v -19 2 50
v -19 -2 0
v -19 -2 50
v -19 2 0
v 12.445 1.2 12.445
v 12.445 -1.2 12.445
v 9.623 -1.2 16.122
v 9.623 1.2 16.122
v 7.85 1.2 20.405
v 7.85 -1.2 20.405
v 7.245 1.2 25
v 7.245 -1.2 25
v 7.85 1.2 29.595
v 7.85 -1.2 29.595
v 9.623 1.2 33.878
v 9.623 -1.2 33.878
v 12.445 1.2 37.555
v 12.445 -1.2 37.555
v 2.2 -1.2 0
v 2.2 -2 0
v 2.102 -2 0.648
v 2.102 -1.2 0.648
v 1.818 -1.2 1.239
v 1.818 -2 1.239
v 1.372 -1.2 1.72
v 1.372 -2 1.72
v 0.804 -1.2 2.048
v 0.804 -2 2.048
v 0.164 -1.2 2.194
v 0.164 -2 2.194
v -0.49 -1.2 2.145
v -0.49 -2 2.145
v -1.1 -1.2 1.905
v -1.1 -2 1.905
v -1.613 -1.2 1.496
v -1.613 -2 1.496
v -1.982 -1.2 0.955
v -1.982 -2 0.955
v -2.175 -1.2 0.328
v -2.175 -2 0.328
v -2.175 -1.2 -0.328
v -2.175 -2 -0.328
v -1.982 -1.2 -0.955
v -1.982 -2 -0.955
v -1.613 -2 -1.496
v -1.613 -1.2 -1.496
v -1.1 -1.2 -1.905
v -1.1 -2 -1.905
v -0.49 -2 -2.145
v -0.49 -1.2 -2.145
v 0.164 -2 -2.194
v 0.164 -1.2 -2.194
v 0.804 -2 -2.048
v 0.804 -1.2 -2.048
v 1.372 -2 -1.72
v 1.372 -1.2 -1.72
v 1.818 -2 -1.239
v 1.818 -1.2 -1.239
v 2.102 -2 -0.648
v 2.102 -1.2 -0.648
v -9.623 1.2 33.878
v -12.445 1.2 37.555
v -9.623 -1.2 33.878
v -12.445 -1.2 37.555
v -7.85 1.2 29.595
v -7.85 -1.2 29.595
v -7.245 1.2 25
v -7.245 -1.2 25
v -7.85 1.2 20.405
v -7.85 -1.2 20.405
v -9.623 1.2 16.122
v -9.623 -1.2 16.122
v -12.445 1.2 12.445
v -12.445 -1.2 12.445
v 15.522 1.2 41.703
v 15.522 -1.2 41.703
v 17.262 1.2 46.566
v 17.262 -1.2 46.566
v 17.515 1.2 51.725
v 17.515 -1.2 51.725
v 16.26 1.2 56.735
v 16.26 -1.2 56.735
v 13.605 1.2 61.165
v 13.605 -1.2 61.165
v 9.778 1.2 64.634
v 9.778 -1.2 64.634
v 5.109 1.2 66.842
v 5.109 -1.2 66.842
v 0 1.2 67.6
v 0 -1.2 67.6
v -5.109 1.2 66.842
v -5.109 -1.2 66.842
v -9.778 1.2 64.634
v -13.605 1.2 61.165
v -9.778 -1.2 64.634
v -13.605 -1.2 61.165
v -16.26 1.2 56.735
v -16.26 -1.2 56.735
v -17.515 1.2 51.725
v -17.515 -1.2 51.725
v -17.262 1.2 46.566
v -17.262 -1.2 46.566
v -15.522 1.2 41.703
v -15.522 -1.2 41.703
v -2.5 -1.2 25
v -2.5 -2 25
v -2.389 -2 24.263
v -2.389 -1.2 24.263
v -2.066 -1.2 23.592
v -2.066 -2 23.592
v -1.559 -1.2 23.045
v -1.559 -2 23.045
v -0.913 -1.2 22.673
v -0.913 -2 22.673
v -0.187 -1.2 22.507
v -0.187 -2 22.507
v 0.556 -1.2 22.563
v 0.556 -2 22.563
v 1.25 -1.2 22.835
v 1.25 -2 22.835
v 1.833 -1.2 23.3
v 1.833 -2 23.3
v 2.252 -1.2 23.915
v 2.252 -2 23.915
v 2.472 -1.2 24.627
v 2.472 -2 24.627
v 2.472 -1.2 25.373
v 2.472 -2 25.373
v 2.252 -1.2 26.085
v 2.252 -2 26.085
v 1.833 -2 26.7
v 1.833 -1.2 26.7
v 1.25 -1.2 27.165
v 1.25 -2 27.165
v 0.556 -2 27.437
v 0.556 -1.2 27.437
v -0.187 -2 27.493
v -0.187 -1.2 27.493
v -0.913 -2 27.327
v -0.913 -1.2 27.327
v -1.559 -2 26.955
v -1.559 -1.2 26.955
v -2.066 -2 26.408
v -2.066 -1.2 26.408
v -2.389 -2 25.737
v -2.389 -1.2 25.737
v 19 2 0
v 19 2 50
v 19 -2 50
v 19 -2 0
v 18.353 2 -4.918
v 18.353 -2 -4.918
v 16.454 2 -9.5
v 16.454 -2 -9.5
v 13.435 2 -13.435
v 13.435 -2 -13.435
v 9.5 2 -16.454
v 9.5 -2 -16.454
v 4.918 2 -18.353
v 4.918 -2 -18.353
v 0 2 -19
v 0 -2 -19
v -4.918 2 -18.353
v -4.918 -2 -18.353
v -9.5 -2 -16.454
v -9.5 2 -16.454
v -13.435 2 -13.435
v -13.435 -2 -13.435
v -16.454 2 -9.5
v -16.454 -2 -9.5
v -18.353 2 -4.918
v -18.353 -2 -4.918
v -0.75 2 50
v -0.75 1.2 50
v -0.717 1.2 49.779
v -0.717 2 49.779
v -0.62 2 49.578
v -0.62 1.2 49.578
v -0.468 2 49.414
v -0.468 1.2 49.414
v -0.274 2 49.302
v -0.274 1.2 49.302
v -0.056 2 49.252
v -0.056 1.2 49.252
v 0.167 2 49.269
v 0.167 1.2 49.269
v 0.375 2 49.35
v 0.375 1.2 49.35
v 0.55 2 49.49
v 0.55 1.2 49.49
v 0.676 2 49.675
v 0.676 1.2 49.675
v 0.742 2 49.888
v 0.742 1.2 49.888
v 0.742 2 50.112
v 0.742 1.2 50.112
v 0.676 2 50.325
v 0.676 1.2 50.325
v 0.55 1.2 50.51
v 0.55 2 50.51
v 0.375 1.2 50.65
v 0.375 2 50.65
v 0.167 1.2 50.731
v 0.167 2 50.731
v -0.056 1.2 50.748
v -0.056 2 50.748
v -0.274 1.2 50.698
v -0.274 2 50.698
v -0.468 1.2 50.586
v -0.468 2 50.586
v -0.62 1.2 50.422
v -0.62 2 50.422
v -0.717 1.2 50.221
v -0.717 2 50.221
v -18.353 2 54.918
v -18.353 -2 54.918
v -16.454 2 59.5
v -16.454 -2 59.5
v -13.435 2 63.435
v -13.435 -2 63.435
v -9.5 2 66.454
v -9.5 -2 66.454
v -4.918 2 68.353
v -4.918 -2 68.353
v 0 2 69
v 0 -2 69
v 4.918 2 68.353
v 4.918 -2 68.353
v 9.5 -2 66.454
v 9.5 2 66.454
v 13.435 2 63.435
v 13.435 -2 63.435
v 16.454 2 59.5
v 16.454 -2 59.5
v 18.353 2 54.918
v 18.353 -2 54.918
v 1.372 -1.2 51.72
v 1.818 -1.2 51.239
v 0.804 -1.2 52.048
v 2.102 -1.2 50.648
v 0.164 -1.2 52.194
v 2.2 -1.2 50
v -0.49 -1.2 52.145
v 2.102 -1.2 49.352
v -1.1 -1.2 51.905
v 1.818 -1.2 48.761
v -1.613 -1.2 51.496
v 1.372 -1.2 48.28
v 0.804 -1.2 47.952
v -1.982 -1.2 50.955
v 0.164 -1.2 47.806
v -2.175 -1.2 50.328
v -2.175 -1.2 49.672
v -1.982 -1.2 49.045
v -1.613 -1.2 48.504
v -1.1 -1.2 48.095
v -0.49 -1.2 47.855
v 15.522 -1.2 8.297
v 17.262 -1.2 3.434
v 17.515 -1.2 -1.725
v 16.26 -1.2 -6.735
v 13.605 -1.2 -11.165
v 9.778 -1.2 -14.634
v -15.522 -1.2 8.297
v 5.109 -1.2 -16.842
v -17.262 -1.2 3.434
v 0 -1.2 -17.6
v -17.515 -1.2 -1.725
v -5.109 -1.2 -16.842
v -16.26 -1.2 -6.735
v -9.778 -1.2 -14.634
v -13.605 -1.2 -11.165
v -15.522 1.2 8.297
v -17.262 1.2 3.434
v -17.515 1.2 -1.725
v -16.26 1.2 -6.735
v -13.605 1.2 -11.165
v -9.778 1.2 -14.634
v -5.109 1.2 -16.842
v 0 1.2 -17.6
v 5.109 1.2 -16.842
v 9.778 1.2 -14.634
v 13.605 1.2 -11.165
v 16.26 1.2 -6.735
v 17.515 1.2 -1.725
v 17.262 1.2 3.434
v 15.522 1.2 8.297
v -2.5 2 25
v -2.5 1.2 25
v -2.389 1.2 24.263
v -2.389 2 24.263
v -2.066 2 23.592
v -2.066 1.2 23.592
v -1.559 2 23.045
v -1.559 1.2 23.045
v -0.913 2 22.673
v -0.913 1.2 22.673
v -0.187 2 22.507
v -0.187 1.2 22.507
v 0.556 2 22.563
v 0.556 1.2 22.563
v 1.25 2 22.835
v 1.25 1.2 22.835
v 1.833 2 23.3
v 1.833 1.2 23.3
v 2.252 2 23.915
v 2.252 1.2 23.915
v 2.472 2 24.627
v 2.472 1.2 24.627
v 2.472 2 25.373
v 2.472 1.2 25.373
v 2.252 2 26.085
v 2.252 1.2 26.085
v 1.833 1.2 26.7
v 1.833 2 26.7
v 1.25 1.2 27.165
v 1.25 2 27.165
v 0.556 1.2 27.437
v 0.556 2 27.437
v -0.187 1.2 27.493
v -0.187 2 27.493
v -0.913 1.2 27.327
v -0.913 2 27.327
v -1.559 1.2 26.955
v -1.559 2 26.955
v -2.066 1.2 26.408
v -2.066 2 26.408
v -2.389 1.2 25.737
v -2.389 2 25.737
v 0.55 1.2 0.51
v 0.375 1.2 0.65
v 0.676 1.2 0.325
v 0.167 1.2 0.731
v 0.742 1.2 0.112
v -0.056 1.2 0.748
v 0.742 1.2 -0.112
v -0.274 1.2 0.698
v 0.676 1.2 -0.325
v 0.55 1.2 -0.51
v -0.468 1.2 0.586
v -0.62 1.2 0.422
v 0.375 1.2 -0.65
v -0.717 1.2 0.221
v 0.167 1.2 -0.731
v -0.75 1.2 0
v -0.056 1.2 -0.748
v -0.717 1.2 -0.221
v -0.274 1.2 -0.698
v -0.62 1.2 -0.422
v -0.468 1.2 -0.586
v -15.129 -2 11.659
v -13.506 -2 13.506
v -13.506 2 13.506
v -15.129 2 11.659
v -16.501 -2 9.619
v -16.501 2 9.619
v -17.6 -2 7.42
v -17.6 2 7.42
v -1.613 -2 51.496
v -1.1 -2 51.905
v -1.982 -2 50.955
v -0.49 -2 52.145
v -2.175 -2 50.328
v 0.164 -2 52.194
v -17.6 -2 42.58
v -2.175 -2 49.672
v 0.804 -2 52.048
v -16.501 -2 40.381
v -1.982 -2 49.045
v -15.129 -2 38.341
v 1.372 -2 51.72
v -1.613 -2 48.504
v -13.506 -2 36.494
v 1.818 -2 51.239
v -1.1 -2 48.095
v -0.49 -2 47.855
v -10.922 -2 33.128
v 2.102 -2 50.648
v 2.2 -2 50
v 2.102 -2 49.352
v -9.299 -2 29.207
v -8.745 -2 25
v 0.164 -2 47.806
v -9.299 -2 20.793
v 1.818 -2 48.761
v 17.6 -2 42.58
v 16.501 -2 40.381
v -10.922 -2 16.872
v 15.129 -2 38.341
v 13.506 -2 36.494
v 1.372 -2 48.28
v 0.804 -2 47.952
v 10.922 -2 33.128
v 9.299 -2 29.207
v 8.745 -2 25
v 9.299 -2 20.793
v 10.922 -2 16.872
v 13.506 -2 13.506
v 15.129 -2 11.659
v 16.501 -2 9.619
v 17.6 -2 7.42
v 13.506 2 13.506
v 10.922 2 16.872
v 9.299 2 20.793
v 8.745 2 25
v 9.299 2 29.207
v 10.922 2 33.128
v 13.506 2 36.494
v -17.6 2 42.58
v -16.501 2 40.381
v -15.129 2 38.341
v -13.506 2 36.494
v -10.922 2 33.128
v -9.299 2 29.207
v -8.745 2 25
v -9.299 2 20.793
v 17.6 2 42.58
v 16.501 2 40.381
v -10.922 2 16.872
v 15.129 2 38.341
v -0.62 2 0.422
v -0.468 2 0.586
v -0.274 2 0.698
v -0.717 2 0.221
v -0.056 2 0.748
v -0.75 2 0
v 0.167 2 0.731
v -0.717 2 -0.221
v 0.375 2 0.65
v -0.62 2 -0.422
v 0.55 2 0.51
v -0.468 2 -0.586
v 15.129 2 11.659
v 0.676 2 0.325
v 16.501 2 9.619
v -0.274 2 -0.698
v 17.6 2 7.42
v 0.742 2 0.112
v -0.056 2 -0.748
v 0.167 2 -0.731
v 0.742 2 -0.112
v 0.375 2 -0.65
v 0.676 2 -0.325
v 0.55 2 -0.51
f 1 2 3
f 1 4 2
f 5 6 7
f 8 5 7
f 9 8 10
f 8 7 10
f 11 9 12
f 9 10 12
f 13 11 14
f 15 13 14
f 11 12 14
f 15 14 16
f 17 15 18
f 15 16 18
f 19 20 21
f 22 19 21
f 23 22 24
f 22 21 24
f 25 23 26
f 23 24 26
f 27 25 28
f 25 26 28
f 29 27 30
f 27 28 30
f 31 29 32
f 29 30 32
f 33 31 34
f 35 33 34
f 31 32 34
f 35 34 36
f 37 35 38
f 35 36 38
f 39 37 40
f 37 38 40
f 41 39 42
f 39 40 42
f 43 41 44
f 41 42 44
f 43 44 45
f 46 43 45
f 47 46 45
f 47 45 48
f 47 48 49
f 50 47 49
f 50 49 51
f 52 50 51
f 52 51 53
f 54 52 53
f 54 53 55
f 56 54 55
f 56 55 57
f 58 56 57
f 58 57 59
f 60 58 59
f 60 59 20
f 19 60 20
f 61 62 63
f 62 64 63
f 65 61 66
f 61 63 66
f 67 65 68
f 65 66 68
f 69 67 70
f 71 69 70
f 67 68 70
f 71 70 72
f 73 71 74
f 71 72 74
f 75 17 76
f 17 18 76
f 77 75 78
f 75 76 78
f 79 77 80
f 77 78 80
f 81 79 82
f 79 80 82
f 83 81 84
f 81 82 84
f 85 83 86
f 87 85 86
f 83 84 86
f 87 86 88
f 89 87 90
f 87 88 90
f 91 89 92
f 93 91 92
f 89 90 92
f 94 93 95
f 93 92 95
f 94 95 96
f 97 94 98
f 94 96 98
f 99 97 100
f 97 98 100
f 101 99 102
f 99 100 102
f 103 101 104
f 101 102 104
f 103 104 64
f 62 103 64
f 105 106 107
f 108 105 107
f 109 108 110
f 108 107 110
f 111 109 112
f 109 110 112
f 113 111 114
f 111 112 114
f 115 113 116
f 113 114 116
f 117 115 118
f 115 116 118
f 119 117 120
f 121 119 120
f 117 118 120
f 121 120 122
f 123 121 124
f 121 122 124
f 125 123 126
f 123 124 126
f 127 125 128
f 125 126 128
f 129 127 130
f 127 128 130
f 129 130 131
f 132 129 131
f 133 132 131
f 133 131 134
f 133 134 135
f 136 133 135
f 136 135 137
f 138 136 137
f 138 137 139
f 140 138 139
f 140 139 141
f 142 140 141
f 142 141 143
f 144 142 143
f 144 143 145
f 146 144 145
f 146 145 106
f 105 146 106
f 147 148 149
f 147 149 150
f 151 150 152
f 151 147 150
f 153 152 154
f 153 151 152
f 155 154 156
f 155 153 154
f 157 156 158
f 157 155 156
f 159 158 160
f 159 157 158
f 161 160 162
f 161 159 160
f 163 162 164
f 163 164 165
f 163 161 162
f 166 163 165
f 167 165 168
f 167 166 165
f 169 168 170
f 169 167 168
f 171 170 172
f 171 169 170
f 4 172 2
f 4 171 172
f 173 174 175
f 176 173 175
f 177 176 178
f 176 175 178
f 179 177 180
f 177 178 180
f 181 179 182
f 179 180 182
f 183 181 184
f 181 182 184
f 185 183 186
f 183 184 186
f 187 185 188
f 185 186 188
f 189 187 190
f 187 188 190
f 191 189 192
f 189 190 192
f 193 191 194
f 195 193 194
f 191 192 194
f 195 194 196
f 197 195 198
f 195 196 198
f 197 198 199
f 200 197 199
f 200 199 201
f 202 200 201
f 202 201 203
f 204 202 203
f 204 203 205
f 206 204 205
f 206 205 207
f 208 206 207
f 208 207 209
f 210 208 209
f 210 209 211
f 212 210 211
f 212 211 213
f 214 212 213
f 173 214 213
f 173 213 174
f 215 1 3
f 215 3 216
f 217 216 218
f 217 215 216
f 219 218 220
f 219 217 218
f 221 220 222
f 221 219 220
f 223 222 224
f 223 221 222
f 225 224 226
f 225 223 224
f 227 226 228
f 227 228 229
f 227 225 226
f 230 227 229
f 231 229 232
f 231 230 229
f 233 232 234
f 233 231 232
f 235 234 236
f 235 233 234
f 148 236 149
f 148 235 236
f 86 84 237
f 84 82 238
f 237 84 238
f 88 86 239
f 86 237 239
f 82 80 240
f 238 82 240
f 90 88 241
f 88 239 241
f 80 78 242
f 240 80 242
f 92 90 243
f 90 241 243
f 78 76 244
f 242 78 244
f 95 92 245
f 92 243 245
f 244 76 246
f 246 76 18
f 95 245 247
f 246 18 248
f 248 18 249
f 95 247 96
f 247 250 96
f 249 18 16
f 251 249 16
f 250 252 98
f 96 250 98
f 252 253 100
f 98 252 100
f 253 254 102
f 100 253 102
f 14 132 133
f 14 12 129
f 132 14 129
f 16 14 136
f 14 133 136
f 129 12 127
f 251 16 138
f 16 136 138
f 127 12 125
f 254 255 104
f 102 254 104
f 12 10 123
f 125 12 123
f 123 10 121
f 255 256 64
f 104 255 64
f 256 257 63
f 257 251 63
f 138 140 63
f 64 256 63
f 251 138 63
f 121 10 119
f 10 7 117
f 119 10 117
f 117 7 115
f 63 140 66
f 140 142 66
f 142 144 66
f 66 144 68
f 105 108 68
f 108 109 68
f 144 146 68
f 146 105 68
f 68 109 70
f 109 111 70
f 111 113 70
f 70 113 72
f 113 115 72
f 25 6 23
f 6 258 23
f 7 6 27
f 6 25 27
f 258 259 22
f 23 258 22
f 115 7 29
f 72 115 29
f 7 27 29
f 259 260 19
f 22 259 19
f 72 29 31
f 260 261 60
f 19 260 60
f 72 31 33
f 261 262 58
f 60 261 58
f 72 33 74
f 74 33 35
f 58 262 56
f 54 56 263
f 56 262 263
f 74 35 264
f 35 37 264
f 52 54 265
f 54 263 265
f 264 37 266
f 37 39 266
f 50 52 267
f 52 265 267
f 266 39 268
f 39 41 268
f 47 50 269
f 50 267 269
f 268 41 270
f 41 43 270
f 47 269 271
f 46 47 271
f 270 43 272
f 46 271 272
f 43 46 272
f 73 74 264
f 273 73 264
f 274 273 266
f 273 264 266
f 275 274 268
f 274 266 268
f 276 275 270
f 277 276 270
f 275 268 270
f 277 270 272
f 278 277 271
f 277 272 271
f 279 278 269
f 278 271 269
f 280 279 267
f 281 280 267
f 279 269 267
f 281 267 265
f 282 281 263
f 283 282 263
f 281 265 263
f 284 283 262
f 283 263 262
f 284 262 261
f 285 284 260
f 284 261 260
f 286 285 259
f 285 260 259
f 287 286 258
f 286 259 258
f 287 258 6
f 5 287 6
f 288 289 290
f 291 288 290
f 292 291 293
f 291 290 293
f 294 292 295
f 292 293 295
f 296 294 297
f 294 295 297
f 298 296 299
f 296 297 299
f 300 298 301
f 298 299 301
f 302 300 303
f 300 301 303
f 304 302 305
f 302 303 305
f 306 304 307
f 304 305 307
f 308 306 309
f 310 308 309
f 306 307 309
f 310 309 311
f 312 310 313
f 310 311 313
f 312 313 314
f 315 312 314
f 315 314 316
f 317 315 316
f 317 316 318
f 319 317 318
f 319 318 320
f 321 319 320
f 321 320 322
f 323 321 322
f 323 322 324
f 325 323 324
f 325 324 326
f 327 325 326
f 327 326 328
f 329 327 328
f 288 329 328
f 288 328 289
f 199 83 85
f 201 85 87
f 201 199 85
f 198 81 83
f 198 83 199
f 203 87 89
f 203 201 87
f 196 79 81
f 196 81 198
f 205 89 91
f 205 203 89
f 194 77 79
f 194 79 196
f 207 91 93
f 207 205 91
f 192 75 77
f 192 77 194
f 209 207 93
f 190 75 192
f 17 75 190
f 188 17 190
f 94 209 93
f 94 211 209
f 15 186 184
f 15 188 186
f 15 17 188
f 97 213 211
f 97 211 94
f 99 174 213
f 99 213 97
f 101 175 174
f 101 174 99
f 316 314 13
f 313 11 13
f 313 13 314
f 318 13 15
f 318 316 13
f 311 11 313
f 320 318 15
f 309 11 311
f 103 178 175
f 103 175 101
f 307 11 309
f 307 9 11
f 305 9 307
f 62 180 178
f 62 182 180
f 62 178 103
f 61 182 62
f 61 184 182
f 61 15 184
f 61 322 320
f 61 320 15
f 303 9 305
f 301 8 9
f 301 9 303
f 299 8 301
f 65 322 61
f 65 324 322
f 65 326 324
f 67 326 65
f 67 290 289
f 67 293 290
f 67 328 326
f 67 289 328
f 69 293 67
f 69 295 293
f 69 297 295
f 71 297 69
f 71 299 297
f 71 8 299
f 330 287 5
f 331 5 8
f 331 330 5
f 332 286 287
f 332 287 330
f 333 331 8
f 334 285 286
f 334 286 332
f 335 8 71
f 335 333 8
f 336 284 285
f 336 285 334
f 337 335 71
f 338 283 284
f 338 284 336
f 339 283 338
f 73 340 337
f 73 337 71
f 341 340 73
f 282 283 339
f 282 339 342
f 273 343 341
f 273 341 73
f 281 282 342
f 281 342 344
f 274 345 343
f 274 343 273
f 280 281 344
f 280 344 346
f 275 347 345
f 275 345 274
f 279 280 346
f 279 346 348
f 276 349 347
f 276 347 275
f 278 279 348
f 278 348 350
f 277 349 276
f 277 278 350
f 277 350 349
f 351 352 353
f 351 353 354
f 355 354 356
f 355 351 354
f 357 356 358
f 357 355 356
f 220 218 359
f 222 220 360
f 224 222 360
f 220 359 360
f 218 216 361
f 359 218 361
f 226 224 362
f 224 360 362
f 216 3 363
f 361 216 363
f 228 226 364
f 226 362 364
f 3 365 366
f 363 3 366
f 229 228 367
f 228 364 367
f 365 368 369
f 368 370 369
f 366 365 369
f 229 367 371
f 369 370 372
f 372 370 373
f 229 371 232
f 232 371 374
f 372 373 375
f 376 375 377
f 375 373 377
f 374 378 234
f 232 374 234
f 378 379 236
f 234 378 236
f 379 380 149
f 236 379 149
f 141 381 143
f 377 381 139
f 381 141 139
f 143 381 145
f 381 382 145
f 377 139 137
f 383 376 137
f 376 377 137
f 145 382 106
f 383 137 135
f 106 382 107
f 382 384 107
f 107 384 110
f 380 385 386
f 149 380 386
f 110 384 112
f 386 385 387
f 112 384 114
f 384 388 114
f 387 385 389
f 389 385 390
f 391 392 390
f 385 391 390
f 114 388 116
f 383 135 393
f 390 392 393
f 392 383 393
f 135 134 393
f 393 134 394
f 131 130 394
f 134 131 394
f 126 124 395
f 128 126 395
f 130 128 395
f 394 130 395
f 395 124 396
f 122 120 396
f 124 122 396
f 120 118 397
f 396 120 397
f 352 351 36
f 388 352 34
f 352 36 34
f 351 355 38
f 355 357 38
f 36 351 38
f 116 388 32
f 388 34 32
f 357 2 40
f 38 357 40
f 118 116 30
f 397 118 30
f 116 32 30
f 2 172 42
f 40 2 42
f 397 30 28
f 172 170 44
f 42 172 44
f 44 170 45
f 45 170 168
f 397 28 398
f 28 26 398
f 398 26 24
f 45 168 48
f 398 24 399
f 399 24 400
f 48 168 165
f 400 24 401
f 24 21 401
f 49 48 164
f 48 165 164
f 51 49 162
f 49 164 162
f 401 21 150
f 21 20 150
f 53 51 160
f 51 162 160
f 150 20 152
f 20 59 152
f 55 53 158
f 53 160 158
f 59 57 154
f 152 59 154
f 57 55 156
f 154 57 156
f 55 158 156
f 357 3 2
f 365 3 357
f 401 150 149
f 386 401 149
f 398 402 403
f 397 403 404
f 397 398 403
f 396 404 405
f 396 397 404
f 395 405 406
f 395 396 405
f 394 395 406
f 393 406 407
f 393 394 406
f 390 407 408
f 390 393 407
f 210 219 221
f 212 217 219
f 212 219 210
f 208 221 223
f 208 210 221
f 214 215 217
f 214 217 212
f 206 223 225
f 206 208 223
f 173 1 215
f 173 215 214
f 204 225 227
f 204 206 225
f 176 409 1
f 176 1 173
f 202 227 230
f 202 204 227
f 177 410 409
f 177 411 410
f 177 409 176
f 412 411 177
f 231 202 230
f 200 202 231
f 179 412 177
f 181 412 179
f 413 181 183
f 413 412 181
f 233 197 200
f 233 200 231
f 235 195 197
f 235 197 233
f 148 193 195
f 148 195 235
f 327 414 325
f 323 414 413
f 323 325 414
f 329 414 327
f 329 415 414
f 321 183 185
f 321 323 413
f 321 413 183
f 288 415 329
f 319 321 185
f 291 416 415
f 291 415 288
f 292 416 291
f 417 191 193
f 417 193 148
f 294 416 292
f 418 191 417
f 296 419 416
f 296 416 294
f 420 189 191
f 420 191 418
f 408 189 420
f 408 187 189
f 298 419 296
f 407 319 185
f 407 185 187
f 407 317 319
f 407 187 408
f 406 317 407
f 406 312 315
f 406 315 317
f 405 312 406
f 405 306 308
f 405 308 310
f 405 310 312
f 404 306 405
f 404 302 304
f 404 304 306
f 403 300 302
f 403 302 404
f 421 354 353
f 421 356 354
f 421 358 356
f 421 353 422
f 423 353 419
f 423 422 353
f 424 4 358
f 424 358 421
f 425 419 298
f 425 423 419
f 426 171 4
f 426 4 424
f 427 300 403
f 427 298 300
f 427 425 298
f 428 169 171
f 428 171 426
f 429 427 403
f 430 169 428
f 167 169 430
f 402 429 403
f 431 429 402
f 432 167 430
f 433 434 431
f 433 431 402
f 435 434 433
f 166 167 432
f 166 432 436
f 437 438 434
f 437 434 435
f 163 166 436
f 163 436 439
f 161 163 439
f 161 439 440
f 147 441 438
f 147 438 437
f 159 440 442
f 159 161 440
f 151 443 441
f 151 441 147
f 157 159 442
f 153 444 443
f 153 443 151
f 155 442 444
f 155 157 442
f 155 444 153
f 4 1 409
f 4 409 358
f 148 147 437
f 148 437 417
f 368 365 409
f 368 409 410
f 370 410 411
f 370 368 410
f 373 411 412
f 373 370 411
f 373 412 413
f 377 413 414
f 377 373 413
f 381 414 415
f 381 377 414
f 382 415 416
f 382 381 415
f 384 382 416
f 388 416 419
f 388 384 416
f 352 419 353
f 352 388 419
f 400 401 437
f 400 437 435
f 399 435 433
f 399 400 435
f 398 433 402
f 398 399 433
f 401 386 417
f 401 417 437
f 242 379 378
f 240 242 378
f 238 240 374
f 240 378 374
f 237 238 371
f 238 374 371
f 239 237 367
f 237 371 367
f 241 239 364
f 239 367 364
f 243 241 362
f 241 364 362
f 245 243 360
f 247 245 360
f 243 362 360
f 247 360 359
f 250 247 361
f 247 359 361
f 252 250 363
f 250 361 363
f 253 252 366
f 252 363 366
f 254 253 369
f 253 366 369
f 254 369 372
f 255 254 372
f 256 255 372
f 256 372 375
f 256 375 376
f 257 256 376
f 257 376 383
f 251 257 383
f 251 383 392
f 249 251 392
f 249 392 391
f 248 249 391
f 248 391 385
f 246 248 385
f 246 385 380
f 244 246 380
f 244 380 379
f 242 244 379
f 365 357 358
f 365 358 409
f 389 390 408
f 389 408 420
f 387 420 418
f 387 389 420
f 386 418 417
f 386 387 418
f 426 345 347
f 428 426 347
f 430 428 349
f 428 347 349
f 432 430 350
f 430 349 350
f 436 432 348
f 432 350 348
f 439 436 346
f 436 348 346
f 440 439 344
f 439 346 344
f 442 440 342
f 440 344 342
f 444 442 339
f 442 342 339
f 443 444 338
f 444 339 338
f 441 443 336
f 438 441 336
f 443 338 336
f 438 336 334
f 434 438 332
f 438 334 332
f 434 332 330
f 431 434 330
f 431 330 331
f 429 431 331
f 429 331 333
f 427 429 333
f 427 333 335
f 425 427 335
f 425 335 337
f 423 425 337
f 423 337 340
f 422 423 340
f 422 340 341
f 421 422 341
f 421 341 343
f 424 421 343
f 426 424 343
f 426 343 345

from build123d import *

# Parameters (mm, degrees)
BOSS_EXTRUDE1_DEPTH      = 2
BOSS_EXTRUDE1_DEPTH_BACK = 2
CUT_EXTRUDE1_DEPTH       = 1.2
CUT_EXTRUDE1_DEPTH_BACK  = 1.2
SKETCH4_W                = 7
SKETCH4_H                = 11
BOSS_EXTRUDE2_DEPTH      = 1.2
SWEEP1_PROFILE_R         = 1
SKETCH25_R               = 2.2
CUT_EXTRUDE2_DEPTH       = 2.2
SKETCH26_R               = 2.5
SKETCH26_R_2             = 0.75
CUT_EXTRUDE3_DEPTH       = 10.2
CUT_EXTRUDE4_DEPTH       = 10
CUT_EXTRUDE4_DEPTH_BACK  = 10


with BuildPart() as part:
    # Sketch1 → Boss-Extrude1 (new, two sides: drawn at the far end of the back side and taken through both)
    with BuildSketch(Plane(origin=(0, 0, 0), x_dir=(1, 0, 0), z_dir=(0, 1, 0)).offset(-BOSS_EXTRUDE1_DEPTH_BACK)):
        with BuildLine():
            Line((-19, 0), (-19, -50))
            ThreePointArc((-19, -50), (0, -69), (19, -50))
            Line((19, -50), (19, 0))
            ThreePointArc((19, 0), (0, 19), (-19, 0))
        make_face()
    extrude(amount=BOSS_EXTRUDE1_DEPTH + BOSS_EXTRUDE1_DEPTH_BACK)

    # Sketch3 → Cut-Extrude1 (cut, two sides: drawn at the far end of the back side and taken through both)
    with BuildSketch(Plane(origin=(0, 0, 0), x_dir=(1, 0, 0), z_dir=(0, 1, 0)).offset(-CUT_EXTRUDE1_DEPTH_BACK)):
        with BuildLine():
            ThreePointArc((12.445079349, -37.554920651), (7.244660941, -25), (12.445079349, -12.445079349))
            ThreePointArc((12.445079349, -12.445079349), (16.260279772, -6.73522841), (17.6, 0))
            ThreePointArc((17.6, 0), (0, 17.6), (-17.6, 0))
            ThreePointArc((-17.6, 0), (-16.260279772, -6.73522841), (-12.445079349, -12.445079349))
            ThreePointArc((-12.445079349, -12.445079349), (-7.244660941, -25), (-12.445079349, -37.554920651))
            ThreePointArc((-12.445079349, -37.554920651), (-16.260279772, -43.26477159), (-17.6, -50))
            ThreePointArc((-17.6, -50), (0, -67.6), (17.6, -50))
            ThreePointArc((17.6, -50), (16.260279772, -43.26477159), (12.445079349, -37.554920651))
        make_face()
    extrude(amount=CUT_EXTRUDE1_DEPTH + CUT_EXTRUDE1_DEPTH_BACK, mode=Mode.SUBTRACT)

    # Sketch4 → Boss-Extrude2 (add)
    with BuildSketch(Plane.XZ.offset(2)):
        with Locations((-13.5, 25)):
            Rectangle(SKETCH4_W, SKETCH4_H)
        with Locations((13.5, 25)):
            Rectangle(SKETCH4_W, SKETCH4_H)
    extrude(amount=BOSS_EXTRUDE2_DEPTH)

    # Sweep1: sweep along a path in Sketch6
    with BuildLine(Plane(origin=(-13.5, 0, 0), x_dir=(0, 0, -1), z_dir=(1, 0, 0))) as sweep1_path:
        Line((-22.3, -3.2), (-22.3, -5.3))
        ThreePointArc((-22.3, -5.3), (-24.369122081, -7.65570217), (-26.972043675, -5.907732468))
    # Sweep1 profile (on start of the path) → Sweep1 (sweep)
    with BuildSketch(Plane(origin=(-13.5, -3.2, 22.3), x_dir=(0, 0, -1), z_dir=(0, -1, 0))):
        Circle(SWEEP1_PROFILE_R)
    sweep1 = sweep(path=sweep1_path.line)

    # Mirror1: Sweep1 across plane
    add(sweep1.mirror(Plane(origin=(0, 0, 0), x_dir=(0, 0, 1), z_dir=(1, 0, 0))))

    # Sketch25 → Cut-Extrude2 (cut)
    with BuildSketch(Plane.XZ.offset(2)):
        Circle(SKETCH25_R)
        with Locations((0, 50)):
            Circle(SKETCH25_R)
    extrude(amount=-CUT_EXTRUDE2_DEPTH, mode=Mode.SUBTRACT)

    # Sketch26 → Cut-Extrude3 (cut)
    with BuildSketch(Plane(origin=(0, -2, 0), x_dir=(-1, 0, 0), z_dir=(0, -1, 0))):
        with Locations((0, -25)):
            Circle(SKETCH26_R)
        with Locations((0, -50)):
            Circle(SKETCH26_R_2)
        Circle(SKETCH26_R_2)
    extrude(amount=-CUT_EXTRUDE3_DEPTH, mode=Mode.SUBTRACT)

    # Sketch27 → Cut-Extrude4 (cut, two sides: drawn at the far end of the back side and taken through both)
    with BuildSketch(Plane.XZ.offset(2).offset(-CUT_EXTRUDE4_DEPTH_BACK)):
        with BuildLine():
            Line((-17.6, 7.419568721), (-17.6, 42.580431279))
            ThreePointArc((-17.6, 42.580431279), (-15.847779861, 39.33895533), (-13.505739521, 36.494260479))
            ThreePointArc((-13.505739521, 36.494260479), (-8.744660941, 25), (-13.505739521, 13.505739521))
            ThreePointArc((-13.505739521, 13.505739521), (-15.847779861, 10.66104467), (-17.6, 7.419568721))
        make_face()
        with BuildLine():
            Line((17.6, 42.580431279), (17.6, 7.419568721))
            ThreePointArc((17.6, 7.419568721), (15.847779861, 10.66104467), (13.505739521, 13.505739521))
            ThreePointArc((13.505739521, 13.505739521), (8.744660941, 25), (13.505739521, 36.494260479))
            ThreePointArc((13.505739521, 36.494260479), (15.847779861, 39.33895533), (17.6, 42.580431279))
        make_face()
    extrude(amount=CUT_EXTRUDE4_DEPTH + CUT_EXTRUDE4_DEPTH_BACK, mode=Mode.SUBTRACT)


solid = part.part
